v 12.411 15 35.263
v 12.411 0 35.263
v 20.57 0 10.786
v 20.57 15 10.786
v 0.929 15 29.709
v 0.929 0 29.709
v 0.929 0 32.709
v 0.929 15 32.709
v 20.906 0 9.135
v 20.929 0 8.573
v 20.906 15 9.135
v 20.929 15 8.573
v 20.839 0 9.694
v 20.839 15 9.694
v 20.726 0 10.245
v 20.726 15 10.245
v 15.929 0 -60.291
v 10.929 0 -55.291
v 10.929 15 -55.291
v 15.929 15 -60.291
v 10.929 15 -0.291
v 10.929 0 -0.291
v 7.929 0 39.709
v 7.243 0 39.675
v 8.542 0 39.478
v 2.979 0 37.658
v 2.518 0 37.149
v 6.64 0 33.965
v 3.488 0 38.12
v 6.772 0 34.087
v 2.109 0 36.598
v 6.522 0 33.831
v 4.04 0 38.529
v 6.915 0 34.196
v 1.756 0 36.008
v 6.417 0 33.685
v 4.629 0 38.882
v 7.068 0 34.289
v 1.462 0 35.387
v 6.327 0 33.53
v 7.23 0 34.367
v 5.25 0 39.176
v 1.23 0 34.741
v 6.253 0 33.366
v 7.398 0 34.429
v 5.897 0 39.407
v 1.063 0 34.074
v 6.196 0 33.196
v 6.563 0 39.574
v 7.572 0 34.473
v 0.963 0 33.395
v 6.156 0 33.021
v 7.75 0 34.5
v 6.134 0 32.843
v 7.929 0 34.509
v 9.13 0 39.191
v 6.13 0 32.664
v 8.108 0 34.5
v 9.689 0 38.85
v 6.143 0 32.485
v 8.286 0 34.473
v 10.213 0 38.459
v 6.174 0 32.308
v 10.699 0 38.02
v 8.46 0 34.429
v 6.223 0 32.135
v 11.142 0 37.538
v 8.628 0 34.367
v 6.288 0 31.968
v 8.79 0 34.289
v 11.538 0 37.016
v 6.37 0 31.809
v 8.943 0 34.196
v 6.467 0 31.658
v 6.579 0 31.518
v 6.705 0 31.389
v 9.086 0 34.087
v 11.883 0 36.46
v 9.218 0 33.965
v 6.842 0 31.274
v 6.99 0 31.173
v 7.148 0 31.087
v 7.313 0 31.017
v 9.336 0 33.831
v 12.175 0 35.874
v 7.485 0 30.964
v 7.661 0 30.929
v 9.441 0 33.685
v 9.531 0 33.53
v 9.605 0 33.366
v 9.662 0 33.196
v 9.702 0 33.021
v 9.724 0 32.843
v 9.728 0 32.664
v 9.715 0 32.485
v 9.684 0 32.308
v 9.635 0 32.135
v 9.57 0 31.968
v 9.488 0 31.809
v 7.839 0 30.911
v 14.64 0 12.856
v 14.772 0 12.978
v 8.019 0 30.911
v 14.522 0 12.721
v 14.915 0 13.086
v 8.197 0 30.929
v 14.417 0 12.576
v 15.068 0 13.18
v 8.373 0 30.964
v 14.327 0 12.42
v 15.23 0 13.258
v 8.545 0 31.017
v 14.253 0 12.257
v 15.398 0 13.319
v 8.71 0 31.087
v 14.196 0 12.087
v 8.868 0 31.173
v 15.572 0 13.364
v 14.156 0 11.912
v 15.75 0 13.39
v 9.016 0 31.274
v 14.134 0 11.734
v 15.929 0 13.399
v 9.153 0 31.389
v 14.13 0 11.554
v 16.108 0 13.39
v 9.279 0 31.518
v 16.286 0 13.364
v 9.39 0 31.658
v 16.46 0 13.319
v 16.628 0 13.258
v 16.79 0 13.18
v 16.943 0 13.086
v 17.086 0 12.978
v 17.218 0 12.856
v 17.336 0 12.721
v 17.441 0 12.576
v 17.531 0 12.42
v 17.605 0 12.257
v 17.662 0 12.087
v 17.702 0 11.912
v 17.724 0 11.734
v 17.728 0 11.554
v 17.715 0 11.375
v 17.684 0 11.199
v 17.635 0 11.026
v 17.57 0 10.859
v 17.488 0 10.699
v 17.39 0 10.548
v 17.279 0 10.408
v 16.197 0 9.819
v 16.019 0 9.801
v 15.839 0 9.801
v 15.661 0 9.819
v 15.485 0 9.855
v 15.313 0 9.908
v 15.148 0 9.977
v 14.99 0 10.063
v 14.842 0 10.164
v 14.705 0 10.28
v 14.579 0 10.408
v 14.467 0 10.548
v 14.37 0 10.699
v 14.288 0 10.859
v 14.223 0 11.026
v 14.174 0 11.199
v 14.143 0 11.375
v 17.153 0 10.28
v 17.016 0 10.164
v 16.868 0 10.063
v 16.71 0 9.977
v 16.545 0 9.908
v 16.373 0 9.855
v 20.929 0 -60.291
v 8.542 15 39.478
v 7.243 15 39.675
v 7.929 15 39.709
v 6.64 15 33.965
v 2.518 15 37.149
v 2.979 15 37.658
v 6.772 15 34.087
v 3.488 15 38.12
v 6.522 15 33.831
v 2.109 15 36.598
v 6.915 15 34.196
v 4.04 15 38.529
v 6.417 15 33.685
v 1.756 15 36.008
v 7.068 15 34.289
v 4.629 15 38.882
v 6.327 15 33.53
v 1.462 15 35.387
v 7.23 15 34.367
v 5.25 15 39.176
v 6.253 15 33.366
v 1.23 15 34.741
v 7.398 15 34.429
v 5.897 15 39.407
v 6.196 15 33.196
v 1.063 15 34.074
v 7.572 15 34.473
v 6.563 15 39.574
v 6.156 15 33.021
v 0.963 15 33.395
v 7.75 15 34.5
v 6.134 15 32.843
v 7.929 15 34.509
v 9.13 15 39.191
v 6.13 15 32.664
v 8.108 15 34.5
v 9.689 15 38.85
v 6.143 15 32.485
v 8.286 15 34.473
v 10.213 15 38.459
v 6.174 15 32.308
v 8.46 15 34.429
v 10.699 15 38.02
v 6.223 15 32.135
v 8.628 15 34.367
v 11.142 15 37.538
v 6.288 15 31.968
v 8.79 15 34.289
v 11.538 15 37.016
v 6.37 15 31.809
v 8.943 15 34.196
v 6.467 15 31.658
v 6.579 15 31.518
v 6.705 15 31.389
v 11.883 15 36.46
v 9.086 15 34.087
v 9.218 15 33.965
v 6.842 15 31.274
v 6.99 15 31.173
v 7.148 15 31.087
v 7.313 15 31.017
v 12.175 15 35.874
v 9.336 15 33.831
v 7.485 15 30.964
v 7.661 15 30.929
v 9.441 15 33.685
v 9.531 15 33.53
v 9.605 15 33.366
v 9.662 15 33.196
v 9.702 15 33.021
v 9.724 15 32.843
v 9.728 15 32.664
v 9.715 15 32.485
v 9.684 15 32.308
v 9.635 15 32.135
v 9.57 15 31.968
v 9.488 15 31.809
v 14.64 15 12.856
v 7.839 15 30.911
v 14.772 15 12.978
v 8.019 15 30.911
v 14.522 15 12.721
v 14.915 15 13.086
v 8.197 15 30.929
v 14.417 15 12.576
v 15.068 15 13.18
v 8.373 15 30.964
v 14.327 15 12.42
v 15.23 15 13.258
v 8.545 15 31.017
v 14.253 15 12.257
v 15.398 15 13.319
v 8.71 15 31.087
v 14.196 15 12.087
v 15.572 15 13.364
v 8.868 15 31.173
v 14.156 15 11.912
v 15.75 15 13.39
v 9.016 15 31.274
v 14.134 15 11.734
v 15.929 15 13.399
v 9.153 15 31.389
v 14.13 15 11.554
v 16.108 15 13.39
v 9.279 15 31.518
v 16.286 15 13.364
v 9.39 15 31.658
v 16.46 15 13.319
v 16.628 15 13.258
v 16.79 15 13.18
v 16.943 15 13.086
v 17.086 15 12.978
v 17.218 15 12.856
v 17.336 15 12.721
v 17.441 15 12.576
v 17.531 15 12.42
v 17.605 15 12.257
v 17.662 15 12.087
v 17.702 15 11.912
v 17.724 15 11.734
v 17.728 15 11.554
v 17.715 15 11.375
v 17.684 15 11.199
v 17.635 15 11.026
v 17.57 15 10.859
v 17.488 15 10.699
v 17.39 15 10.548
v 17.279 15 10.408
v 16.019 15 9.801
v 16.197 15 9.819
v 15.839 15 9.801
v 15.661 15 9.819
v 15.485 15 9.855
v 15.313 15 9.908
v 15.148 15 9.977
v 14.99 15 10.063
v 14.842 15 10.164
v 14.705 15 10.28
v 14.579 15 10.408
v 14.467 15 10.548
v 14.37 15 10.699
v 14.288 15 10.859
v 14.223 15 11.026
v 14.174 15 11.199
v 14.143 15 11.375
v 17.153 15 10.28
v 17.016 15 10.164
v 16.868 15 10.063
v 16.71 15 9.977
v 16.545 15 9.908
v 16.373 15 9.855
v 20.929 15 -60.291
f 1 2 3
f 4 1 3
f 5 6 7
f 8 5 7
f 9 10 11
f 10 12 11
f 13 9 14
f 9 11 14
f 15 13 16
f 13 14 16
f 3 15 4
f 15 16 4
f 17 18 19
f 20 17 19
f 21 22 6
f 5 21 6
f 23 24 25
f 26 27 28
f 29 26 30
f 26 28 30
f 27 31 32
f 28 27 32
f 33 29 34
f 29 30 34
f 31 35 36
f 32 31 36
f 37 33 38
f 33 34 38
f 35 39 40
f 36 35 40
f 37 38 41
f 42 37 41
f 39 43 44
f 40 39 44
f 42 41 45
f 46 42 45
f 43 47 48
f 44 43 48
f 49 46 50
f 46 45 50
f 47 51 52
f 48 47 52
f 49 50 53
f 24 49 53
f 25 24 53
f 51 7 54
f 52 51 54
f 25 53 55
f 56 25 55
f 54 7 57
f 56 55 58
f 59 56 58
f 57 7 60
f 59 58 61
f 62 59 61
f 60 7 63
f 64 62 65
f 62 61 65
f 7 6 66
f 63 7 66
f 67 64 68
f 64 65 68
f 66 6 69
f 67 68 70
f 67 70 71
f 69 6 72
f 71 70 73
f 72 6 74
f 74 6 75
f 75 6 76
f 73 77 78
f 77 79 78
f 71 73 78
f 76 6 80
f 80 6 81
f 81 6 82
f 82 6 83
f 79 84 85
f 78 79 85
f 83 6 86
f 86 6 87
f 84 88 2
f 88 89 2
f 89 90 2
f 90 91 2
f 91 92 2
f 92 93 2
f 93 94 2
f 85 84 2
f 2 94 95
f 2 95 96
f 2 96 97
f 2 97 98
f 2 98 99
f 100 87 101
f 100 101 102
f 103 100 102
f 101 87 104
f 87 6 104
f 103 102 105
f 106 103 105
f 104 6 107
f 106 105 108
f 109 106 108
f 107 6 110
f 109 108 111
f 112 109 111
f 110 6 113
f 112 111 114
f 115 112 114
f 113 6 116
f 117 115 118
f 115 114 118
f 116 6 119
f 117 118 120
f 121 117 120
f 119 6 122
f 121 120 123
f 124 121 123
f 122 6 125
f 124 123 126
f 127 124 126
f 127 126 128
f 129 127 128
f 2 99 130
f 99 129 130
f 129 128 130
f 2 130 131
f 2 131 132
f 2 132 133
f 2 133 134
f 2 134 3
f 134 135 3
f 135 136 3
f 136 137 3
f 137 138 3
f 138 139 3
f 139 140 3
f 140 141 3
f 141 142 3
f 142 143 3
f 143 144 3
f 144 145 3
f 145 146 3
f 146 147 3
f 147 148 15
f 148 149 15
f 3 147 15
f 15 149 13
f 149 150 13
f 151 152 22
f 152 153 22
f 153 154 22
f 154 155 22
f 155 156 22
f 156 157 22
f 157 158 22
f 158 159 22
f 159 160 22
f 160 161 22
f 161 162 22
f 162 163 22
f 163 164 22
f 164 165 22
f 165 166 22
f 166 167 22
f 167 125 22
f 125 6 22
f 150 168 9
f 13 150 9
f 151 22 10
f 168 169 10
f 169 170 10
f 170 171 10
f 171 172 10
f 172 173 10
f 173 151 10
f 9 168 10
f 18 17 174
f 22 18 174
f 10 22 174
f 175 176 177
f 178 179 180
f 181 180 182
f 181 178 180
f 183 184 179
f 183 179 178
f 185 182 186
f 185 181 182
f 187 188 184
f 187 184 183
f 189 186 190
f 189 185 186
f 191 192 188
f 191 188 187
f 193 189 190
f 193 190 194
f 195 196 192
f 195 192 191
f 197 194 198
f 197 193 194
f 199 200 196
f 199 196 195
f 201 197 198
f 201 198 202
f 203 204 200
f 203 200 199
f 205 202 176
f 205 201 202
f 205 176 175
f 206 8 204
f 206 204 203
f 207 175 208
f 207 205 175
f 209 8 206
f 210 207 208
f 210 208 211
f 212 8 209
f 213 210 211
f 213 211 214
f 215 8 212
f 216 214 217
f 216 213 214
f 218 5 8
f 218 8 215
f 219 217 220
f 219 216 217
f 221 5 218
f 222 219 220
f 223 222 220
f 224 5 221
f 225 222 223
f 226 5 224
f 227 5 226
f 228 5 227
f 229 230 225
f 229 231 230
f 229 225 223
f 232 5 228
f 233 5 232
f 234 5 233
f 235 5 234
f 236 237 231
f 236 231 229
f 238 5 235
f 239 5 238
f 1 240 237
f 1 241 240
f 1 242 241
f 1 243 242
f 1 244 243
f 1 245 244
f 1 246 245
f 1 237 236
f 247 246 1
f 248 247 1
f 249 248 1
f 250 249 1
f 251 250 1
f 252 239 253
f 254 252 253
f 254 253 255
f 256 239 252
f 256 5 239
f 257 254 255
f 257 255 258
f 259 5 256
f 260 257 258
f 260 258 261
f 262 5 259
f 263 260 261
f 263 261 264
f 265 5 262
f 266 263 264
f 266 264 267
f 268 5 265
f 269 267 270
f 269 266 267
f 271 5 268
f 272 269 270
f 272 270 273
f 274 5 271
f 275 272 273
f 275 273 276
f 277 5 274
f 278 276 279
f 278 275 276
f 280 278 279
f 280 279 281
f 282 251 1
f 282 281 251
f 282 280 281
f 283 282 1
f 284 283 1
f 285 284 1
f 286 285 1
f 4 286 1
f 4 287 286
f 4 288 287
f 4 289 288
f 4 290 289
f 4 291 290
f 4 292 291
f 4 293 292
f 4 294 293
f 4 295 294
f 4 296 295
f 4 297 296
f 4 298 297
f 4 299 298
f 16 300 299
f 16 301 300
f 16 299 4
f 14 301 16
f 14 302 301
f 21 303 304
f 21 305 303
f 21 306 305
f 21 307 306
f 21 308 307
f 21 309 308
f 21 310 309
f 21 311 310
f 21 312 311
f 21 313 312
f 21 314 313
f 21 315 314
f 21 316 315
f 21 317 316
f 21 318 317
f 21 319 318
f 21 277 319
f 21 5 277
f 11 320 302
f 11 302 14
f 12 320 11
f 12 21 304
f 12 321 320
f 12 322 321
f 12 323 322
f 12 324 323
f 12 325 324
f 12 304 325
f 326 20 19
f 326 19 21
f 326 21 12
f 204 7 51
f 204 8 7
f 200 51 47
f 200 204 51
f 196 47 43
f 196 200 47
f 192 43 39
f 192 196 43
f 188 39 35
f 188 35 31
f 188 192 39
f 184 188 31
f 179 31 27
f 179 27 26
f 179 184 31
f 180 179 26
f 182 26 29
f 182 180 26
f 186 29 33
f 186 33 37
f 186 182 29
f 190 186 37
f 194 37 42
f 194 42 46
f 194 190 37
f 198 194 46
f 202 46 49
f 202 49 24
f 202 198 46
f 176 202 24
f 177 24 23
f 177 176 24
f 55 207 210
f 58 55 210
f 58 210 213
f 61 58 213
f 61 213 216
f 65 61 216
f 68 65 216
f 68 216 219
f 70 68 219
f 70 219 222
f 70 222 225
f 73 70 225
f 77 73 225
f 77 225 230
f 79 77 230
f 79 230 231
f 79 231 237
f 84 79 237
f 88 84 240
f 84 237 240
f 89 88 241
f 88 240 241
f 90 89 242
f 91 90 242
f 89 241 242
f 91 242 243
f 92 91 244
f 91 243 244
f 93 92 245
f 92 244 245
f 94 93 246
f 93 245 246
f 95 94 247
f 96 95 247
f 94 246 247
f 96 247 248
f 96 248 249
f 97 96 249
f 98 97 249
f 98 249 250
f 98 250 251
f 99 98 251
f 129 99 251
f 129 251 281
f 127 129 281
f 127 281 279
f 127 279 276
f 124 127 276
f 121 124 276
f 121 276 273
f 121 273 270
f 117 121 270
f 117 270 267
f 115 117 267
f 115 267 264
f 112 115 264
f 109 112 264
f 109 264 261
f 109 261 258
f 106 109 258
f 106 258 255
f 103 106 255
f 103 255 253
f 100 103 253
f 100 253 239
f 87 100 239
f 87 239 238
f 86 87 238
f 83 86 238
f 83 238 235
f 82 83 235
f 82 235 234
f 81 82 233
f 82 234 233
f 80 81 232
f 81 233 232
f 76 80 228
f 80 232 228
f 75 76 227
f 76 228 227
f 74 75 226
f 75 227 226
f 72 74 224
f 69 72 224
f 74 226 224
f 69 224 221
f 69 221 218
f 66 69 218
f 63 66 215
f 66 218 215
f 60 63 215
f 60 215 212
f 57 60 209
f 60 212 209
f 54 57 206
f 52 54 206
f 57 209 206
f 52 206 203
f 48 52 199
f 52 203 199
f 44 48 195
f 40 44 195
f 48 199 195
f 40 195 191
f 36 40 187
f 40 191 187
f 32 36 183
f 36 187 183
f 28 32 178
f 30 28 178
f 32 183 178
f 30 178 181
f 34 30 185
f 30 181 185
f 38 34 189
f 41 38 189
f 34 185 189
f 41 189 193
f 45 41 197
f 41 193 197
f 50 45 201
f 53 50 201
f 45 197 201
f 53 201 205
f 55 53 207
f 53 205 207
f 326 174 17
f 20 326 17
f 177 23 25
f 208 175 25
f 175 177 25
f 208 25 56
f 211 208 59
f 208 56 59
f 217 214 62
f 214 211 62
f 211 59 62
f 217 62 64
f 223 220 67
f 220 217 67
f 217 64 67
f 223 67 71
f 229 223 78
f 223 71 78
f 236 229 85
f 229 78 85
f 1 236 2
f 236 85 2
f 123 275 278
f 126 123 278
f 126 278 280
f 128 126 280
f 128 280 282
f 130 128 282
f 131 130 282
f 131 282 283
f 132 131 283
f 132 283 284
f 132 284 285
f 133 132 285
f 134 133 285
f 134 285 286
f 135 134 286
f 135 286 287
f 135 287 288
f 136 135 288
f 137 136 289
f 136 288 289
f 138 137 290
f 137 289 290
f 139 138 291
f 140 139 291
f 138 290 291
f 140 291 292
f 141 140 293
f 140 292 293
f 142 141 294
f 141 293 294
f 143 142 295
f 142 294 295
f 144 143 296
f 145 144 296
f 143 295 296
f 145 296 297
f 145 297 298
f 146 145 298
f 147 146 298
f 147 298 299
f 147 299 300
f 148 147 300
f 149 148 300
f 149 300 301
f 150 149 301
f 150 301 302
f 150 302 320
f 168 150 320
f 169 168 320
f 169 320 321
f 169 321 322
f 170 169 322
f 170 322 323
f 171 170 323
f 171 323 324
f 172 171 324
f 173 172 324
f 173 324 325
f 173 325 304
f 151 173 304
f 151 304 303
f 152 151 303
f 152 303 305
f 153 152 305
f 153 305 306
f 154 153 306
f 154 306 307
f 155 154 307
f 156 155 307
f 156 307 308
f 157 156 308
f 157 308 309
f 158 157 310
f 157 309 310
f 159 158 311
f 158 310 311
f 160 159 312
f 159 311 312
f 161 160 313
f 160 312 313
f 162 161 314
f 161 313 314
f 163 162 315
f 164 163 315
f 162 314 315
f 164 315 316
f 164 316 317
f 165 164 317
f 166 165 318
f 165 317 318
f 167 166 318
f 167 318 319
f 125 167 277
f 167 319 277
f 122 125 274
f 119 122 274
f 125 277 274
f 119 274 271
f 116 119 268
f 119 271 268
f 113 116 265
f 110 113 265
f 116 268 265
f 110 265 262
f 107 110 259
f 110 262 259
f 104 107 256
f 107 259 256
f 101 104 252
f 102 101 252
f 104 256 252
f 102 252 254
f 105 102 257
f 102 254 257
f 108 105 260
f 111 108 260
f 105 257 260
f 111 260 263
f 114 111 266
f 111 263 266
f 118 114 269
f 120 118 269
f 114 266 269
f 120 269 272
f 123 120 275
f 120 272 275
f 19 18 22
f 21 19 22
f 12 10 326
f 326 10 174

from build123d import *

# Parameters (mm, degrees)
BOSS_EXTRUDE1_DEPTH = 15
FILLET1_R           = 7
SKETCH2_R           = 1.8
CUT_EXTRUDE1_DEPTH  = 66.559736532
FILLET3_R           = 7
FILLET5_R           = 7
CHAMFER2_SIZE       = 5


with BuildPart() as part:
    # Sketch1 → Boss-Extrude1 (new body)
    with BuildSketch(Plane(origin=(0, 0, 0), x_dir=(1, 0, 0), z_dir=(0, 1, 0))):
        Polygon((10.928961749, 60.29143898), (10.928961749, 0.29143898), (0.928961749, -29.70856102), (0.928961749, -39.70856102), (10.928961749, -39.70856102), (20.928961749, -9.70856102), (20.928961749, 60.29143898), align=None)
    extrude(amount=BOSS_EXTRUDE1_DEPTH)

    # Fillet1
    fillet1_edges = [part.edges().sort_by_distance(p)[0] for p in [
        (0.928961749, 7.5, 39.70856102),
    ]]
    fillet(fillet1_edges, radius=FILLET1_R)

    # Sketch2 → Cut-Extrude1 (cut, through all)
    with BuildSketch(Plane(origin=(0, 15, 0), x_dir=(1, 0, 0), z_dir=(0, 1, 0))):
        with Locations(Location((15.928961749, -11.599196317, 0), (0, 0, 270))):
            Circle(SKETCH2_R)
        with Locations(Location((7.928961749, -32.70856102, 0), (0, 0, 270))):
            Circle(SKETCH2_R)
    extrude(amount=-CUT_EXTRUDE1_DEPTH, mode=Mode.SUBTRACT)

    # Fillet3
    # the kernel refuses this fillet: 7 mm, written as the material it takes off along each edge
    with BuildSketch(Plane(origin=(10.928961749, -11.713900217, 39.70856102), x_dir=(-1, 0, 0), z_dir=(0, 1, 0))) as fillet3_piece_1:
        with BuildLine():
            CenterArc((5.159078888, -6.658706958), FILLET3_R, 107.965233202, 53.599817975)
            Line((-1.481704199, -4.445112596), (-1.61451986, -4.400840709))
            Line((-1.61451986, -4.400840709), (-0.132815662, 0.044271887))
            Line((-0.132815662, 0.044271887), (0, 0.14))
            ThreePointArc((0, 0.14), (1.5, 0.14), (2.956818422, 0.133174139))
            Line((2.956818422, 0.133174139), (3, 0))
        make_face()
    extrude(amount=38.427800433, mode=Mode.SUBTRACT)

    # Fillet5
    fillet5_edges = [part.edges().sort_by_distance(p)[0] for p in [
        (20.928961749, 7.5, 9.70856102),
    ]]
    fillet(fillet5_edges, radius=FILLET5_R)

    # Chamfer2
    chamfer2_edges = [part.edges().sort_by_distance(p)[0] for p in [
        (10.928961749, 7.5, -60.29143898),
    ]]
    chamfer(chamfer2_edges, length=CHAMFER2_SIZE)


solid = part.part
